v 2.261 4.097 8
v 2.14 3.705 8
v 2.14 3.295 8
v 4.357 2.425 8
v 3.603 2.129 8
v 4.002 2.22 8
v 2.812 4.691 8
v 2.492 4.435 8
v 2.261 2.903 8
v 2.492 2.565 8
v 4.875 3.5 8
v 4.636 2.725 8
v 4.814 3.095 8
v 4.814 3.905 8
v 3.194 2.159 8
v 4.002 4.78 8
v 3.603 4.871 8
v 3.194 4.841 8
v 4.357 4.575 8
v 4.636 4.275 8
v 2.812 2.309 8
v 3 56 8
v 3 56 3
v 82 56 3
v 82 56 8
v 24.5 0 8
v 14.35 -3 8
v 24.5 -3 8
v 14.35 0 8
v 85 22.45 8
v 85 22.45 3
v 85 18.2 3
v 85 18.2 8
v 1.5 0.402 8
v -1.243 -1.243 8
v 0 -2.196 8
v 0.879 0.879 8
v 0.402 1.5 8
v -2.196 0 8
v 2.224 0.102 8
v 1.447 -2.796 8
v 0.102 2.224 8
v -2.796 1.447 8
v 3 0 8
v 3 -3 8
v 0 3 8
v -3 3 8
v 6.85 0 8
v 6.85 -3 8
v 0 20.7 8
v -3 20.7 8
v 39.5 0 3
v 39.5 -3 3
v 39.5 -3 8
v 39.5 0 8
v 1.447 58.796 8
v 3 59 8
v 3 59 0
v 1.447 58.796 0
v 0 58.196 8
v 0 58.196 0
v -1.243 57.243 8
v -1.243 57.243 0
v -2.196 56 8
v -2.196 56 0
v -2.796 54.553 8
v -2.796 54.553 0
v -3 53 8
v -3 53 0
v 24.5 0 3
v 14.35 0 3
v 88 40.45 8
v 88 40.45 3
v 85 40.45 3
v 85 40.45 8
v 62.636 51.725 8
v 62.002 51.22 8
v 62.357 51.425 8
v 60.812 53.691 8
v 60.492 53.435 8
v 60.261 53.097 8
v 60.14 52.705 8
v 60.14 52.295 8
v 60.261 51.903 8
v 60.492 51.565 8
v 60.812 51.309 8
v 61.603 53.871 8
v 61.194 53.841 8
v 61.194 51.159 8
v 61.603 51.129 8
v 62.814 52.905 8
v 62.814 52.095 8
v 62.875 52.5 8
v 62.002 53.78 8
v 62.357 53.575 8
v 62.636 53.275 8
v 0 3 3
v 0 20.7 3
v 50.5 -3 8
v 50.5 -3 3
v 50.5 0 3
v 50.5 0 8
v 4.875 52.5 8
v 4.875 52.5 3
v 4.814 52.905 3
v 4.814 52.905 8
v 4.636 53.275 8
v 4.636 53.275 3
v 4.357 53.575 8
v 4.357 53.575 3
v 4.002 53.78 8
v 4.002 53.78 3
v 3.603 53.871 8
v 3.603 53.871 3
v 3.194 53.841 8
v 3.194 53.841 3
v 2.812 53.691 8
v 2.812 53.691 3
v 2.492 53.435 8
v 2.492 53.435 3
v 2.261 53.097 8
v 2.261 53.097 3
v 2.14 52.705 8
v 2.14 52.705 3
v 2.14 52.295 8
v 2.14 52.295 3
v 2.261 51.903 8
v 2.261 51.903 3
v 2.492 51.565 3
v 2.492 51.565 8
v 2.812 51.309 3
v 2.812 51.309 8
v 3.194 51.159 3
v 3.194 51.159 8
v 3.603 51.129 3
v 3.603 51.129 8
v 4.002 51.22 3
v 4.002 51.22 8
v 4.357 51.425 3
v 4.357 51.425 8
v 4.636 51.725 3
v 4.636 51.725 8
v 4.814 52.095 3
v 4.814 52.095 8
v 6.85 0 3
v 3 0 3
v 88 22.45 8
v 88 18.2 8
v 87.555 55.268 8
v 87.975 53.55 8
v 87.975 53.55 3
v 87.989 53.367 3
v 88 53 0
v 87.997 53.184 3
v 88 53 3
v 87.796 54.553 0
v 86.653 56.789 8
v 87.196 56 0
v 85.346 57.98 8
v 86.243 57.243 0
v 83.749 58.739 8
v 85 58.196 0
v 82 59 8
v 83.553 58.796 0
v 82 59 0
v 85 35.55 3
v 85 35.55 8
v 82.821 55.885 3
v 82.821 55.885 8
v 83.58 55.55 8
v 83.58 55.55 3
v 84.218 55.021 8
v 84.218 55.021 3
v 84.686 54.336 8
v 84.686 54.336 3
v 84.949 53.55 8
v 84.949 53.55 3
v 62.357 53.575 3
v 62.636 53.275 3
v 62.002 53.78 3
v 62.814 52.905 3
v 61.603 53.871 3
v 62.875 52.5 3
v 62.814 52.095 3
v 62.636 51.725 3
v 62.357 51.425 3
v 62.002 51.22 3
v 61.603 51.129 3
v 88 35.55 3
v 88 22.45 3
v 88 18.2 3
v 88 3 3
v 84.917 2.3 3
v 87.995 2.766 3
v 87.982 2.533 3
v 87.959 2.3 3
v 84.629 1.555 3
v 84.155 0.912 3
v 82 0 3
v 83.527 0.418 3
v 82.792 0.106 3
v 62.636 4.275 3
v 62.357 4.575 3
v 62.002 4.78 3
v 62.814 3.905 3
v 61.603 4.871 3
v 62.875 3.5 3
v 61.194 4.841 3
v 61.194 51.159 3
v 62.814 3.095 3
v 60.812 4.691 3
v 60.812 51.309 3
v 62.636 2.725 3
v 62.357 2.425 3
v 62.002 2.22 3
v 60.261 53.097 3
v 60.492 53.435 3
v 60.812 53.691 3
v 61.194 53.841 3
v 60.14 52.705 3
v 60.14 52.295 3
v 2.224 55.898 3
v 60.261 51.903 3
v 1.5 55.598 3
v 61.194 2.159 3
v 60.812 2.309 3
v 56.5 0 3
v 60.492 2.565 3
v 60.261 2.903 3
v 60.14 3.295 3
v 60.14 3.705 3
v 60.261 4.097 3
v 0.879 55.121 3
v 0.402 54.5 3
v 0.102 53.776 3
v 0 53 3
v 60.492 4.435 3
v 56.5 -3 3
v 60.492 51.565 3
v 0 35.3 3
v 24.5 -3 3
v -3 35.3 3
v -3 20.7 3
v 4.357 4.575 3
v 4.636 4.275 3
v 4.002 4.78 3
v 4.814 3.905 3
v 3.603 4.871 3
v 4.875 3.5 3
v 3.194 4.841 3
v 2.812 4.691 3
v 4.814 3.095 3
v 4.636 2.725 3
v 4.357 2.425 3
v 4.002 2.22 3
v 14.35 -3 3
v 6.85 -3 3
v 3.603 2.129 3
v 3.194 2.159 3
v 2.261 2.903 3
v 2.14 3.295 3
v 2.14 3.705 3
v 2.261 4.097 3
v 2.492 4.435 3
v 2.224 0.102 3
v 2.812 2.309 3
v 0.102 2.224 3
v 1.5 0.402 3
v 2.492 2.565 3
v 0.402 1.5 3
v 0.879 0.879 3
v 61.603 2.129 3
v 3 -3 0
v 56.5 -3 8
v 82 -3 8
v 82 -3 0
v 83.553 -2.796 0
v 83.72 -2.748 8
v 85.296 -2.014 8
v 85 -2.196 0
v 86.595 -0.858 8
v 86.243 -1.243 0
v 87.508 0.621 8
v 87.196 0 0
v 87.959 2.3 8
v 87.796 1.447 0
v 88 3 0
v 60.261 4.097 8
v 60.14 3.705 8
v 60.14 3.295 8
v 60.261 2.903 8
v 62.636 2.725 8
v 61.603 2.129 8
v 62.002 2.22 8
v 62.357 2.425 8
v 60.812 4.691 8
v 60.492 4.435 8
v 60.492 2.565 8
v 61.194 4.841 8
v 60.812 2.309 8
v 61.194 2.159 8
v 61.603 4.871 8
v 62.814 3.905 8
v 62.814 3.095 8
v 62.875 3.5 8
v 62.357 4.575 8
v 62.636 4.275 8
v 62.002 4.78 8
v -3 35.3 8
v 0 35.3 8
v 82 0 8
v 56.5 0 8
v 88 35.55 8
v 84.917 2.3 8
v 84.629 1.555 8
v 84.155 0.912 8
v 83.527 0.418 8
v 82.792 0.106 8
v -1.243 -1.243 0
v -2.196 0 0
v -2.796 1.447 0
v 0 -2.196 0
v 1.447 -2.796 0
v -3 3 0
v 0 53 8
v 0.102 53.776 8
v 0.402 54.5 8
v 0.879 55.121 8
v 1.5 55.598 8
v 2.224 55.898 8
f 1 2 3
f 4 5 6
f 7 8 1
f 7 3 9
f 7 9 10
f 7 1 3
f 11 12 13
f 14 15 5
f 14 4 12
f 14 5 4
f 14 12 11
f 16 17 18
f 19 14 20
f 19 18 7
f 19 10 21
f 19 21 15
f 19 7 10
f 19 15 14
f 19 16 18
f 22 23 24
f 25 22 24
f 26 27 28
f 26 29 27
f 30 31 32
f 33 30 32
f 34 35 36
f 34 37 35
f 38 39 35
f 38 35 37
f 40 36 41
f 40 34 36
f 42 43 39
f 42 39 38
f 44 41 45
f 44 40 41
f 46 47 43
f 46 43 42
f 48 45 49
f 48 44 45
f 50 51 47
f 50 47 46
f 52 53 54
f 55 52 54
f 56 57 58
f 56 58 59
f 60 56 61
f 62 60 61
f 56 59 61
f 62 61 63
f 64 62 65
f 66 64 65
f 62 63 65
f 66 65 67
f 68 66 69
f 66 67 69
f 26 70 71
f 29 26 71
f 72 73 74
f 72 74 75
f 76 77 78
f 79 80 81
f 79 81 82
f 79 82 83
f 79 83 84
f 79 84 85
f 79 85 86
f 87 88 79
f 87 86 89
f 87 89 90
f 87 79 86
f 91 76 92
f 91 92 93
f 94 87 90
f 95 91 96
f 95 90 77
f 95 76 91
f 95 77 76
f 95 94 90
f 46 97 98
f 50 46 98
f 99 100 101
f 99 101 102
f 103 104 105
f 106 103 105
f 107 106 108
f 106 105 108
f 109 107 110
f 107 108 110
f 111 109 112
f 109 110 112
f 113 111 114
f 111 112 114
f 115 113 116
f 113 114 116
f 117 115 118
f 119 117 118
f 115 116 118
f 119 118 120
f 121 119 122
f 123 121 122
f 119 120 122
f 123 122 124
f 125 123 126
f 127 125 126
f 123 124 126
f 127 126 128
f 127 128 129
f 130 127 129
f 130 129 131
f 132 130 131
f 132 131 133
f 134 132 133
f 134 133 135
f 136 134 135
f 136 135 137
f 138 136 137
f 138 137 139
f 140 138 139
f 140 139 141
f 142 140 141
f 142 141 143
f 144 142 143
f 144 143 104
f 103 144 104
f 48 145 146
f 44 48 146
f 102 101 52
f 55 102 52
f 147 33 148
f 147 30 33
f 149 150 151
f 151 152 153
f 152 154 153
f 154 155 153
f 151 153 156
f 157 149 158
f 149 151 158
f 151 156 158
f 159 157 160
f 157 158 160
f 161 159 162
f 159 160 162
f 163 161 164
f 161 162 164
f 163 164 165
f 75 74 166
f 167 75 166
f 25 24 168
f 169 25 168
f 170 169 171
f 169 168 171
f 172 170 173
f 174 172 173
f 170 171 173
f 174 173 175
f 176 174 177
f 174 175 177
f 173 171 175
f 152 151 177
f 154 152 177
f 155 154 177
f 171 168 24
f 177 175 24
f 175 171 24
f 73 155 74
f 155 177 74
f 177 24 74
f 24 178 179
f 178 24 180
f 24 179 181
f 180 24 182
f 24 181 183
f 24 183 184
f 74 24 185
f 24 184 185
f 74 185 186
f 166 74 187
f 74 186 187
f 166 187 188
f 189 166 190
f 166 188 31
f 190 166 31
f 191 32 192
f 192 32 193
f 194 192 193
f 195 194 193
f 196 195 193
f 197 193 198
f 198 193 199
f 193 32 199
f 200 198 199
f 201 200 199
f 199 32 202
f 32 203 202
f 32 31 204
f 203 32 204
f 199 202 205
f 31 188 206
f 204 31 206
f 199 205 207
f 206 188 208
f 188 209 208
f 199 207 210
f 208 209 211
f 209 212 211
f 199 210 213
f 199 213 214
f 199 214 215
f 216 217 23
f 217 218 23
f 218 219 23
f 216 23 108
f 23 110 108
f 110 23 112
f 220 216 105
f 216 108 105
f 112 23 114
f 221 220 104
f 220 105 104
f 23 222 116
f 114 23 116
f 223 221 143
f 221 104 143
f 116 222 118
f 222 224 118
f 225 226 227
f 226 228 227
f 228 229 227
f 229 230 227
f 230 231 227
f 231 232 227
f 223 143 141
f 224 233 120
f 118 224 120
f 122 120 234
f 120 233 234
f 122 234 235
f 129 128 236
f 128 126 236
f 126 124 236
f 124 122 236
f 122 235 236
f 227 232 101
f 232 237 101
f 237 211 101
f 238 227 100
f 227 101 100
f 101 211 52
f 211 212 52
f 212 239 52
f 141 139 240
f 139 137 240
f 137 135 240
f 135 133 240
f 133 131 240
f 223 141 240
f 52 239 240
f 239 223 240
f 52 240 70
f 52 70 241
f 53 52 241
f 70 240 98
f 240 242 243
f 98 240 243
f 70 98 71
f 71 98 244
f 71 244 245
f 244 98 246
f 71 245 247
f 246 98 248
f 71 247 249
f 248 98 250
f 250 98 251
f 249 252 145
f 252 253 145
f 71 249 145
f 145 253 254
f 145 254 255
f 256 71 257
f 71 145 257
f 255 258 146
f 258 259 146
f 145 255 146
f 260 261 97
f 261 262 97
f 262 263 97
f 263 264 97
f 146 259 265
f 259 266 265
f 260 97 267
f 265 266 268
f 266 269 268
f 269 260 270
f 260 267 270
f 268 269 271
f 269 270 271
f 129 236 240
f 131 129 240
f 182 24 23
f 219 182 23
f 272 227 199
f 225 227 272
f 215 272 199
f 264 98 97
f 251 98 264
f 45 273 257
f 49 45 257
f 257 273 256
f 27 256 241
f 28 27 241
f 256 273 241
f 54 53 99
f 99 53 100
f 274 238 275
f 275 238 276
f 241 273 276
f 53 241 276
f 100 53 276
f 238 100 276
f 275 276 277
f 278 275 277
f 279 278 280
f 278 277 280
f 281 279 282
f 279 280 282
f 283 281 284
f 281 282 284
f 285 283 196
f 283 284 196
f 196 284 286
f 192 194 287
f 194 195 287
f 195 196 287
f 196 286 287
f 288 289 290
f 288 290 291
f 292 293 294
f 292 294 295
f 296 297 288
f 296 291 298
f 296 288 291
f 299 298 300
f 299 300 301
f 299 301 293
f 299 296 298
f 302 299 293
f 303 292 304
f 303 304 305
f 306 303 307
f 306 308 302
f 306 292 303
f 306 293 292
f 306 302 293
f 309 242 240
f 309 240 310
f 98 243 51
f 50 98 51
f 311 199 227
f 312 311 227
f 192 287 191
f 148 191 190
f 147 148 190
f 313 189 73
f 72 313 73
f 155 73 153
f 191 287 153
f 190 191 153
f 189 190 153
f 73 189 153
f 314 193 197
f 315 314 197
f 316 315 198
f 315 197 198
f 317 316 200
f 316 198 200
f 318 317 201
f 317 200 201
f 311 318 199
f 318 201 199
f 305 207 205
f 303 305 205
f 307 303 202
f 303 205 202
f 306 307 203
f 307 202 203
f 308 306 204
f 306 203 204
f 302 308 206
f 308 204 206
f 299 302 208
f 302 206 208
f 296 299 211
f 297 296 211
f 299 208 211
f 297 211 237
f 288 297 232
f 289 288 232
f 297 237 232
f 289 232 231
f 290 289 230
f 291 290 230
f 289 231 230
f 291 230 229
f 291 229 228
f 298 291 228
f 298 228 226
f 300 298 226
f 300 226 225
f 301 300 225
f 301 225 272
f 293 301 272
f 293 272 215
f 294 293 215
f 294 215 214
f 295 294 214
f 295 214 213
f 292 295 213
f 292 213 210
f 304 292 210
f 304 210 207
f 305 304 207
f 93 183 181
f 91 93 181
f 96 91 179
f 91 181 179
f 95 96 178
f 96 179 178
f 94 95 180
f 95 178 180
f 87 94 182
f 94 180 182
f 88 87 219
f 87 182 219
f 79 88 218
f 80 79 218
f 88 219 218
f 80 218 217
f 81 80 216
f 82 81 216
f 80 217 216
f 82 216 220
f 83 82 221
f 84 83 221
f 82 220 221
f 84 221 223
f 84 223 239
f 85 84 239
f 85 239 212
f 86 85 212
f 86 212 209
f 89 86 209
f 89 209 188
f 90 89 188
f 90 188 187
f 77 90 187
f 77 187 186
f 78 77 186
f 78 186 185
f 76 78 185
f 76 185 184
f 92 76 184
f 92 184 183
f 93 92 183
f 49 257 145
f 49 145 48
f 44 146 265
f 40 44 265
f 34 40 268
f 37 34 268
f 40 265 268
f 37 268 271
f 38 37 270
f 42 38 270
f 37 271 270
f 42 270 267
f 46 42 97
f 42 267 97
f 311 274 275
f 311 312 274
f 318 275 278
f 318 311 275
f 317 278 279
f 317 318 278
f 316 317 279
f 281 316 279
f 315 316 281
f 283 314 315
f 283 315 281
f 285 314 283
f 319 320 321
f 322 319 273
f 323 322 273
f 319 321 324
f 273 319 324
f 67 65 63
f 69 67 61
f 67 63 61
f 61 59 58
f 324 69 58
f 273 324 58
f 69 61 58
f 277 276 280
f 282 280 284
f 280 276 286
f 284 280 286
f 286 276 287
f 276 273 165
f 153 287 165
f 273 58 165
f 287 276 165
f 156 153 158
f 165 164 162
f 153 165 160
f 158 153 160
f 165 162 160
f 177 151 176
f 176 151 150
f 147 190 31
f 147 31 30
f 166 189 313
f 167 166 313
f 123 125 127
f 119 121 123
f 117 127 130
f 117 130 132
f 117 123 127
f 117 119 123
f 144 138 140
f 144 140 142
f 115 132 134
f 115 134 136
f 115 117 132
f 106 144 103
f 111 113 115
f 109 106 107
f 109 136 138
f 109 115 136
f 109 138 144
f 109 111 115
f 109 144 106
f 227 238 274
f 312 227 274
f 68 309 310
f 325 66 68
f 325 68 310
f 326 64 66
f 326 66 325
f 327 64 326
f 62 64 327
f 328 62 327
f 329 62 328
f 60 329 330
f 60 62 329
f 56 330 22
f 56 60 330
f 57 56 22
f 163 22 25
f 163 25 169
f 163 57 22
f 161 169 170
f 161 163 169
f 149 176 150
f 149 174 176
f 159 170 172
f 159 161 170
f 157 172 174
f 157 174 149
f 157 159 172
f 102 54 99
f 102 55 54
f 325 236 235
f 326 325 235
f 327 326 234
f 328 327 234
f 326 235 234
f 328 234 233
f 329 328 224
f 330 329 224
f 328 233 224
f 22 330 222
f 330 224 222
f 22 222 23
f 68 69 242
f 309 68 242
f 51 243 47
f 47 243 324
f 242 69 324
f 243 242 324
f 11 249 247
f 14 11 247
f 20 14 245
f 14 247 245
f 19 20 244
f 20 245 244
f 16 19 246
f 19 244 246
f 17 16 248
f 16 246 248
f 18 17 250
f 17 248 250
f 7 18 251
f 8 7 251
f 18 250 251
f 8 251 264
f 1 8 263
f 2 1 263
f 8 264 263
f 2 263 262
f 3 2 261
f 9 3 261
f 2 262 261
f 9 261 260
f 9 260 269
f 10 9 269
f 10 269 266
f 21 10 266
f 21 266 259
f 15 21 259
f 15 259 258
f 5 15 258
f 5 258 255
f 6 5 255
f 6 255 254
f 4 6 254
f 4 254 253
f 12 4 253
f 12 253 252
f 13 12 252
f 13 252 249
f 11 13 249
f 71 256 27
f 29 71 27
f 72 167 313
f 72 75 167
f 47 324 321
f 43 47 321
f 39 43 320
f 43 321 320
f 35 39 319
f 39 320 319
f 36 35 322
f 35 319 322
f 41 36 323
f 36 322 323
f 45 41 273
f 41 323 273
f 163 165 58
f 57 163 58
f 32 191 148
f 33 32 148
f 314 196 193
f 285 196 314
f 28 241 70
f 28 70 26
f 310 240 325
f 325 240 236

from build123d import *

# Parameters (mm, degrees)
F1_DEPTH  = 8
F0_R      = 3.1
F0_R_2    = 1.375
F2_DEPTH  = 3
F3_DEPTH  = 8
F4_W      = 7.5
F4_H      = 5
F5_DEPTH  = 3
F4_W_2    = 15
F4_W_3    = 6
F6_DEPTH  = 3
F7_W      = 15.9
F7_H      = 5
F7_W_2    = 13.1
F8_DEPTH  = 3
F9_W      = 14.6
F9_H      = 5
F10_DEPTH = 3
F11_DEPTH = 10


with BuildPart() as f1:
    # F0 (on Top) → F1 (new body)
    with BuildSketch(Plane.XY):
        with BuildLine():
            Line((82, 59), (3, 59))
            ThreePointArc((3, 59), (-1.242641, 57.242641), (-3, 53))
            Line((-3, 53), (-3, 3))
            ThreePointArc((-3, 3), (-1.242641, -1.242641), (3, -3))
            Line((3, -3), (82, -3))
            ThreePointArc((82, -3), (86.242641, -1.242641), (88, 3))
            Line((88, 3), (88, 53))
            ThreePointArc((88, 53), (86.242641, 57.242641), (82, 59))
        make_face()
        with BuildLine():
            Line((82, 0), (3, 0))
            ThreePointArc((3, 0), (0.87868, 0.87868), (0, 3))
            Line((0, 3), (0, 53))
            ThreePointArc((0, 53), (0.87868, 55.12132), (3, 56))
            Line((3, 56), (82, 56))
            ThreePointArc((82, 56), (84.12132, 55.12132), (85, 53))
            Line((85, 53), (85, 3))
            ThreePointArc((85, 3), (84.12132, 0.87868), (82, 0))
        make_face(mode=Mode.SUBTRACT)
    extrude(amount=F1_DEPTH)

    # F0 (on Top) → F2 (join)
    with BuildSketch(Plane.XY):
        with BuildLine():
            Line((82, 59), (3, 59))
            ThreePointArc((3, 59), (-1.242641, 57.242641), (-3, 53))
            Line((-3, 53), (-3, 3))
            ThreePointArc((-3, 3), (-1.242641, -1.242641), (3, -3))
            Line((3, -3), (82, -3))
            ThreePointArc((82, -3), (86.242641, -1.242641), (88, 3))
            Line((88, 3), (88, 53))
            ThreePointArc((88, 53), (86.242641, 57.242641), (82, 59))
        make_face()
        with BuildLine():
            Line((82, 0), (3, 0))
            ThreePointArc((3, 0), (0.87868, 0.87868), (0, 3))
            Line((0, 3), (0, 53))
            ThreePointArc((0, 53), (0.87868, 55.12132), (3, 56))
            Line((3, 56), (82, 56))
            ThreePointArc((82, 56), (84.12132, 55.12132), (85, 53))
            Line((85, 53), (85, 3))
            ThreePointArc((85, 3), (84.12132, 0.87868), (82, 0))
        make_face(mode=Mode.SUBTRACT)
        with BuildLine():
            ThreePointArc((0, 3), (0.87868, 0.87868), (3, 0))
            Line((3, 0), (82, 0))
            ThreePointArc((82, 0), (84.12132, 0.87868), (85, 3))
            Line((85, 3), (85, 53))
            ThreePointArc((85, 53), (84.12132, 55.12132), (82, 56))
            Line((82, 56), (3, 56))
            ThreePointArc((3, 56), (0.87868, 55.12132), (0, 53))
            Line((0, 53), (0, 3))
        make_face()
        with Locations((3.5, 3.5)):
            Circle(F0_R, mode=Mode.SUBTRACT)
        with Locations((61.5, 3.5)):
            Circle(F0_R, mode=Mode.SUBTRACT)
        with Locations((3.5, 52.5)):
            Circle(F0_R, mode=Mode.SUBTRACT)
        with Locations((61.5, 52.5)):
            Circle(F0_R, mode=Mode.SUBTRACT)
        with Locations((3.5, 3.5)):
            Circle(F0_R)
        with Locations((3.5, 3.5)):
            Circle(F0_R_2, mode=Mode.SUBTRACT)
        with Locations((3.5, 3.5)):
            Circle(F0_R_2)
        with Locations((61.5, 3.5)):
            Circle(F0_R)
        with Locations((61.5, 3.5)):
            Circle(F0_R_2, mode=Mode.SUBTRACT)
        with Locations((61.5, 3.5)):
            Circle(F0_R_2)
        with Locations((61.5, 52.5)):
            Circle(F0_R)
        with Locations((61.5, 52.5)):
            Circle(F0_R_2, mode=Mode.SUBTRACT)
        with Locations((61.5, 52.5)):
            Circle(F0_R_2)
        with Locations((3.5, 52.5)):
            Circle(F0_R)
        with Locations((3.5, 52.5)):
            Circle(F0_R_2, mode=Mode.SUBTRACT)
        with Locations((3.5, 52.5)):
            Circle(F0_R_2)
    extrude(amount=F2_DEPTH)

    # F0 (on Top) → F3 (join)
    with BuildSketch(Plane.XY):
        with Locations((3.5, 3.5)):
            Circle(F0_R_2)
        with Locations((61.5, 3.5)):
            Circle(F0_R_2)
        with Locations((3.5, 52.5)):
            Circle(F0_R_2)
        with Locations((61.5, 52.5)):
            Circle(F0_R_2)
    extrude(amount=F3_DEPTH)

    # F4 (on face) → F5 (cut, through all)
    with BuildSketch(Plane.XZ.offset(3)):
        with Locations((10.6, 5.5)):
            Rectangle(F4_W, F4_H)
    extrude(amount=-F5_DEPTH, mode=Mode.SUBTRACT)

    # F4 (on face) → F6 (cut, through all)
    with BuildSketch(Plane.XZ.offset(3)):
        with Locations((10.6, 5.5)):
            Rectangle(F4_W, F4_H)
        with Locations((32, 5.5)):
            Rectangle(F4_W_2, F4_H)
        with Locations((53.5, 5.5)):
            Rectangle(F4_W_3, F4_H)
    extrude(amount=-F6_DEPTH, mode=Mode.SUBTRACT)

    # F7 (on face) → F8 (cut, through all)
    with BuildSketch(Plane.YZ.offset(88)):
        with Locations((10.25, 5.5)):
            Rectangle(F7_W, F7_H)
        with Locations((29, 5.5)):
            Rectangle(F7_W_2, F7_H)
        with Locations((47, 5.5)):
            Rectangle(F7_W_2, F7_H)
    extrude(amount=-F8_DEPTH, mode=Mode.SUBTRACT)

    # F9 (on face) → F10 (cut, through all)
    with BuildSketch(Plane(origin=(-3, 0, 0), x_dir=(0, -1, 0), z_dir=(-1, 0, 0))):
        with Locations((-28, 5.5)):
            Rectangle(F9_W, F9_H)
    extrude(amount=-F10_DEPTH, mode=Mode.SUBTRACT)

    # F7 (on face) → F11 (cut)
    with BuildSketch(Plane.YZ.offset(88)):
        with Locations((10.25, 5.5)):
            Rectangle(F7_W, F7_H)
        with Locations((29, 5.5)):
            Rectangle(F7_W_2, F7_H)
        with Locations((47, 5.5)):
            Rectangle(F7_W_2, F7_H)
    extrude(amount=-F11_DEPTH, mode=Mode.SUBTRACT)


solid = f1.part
